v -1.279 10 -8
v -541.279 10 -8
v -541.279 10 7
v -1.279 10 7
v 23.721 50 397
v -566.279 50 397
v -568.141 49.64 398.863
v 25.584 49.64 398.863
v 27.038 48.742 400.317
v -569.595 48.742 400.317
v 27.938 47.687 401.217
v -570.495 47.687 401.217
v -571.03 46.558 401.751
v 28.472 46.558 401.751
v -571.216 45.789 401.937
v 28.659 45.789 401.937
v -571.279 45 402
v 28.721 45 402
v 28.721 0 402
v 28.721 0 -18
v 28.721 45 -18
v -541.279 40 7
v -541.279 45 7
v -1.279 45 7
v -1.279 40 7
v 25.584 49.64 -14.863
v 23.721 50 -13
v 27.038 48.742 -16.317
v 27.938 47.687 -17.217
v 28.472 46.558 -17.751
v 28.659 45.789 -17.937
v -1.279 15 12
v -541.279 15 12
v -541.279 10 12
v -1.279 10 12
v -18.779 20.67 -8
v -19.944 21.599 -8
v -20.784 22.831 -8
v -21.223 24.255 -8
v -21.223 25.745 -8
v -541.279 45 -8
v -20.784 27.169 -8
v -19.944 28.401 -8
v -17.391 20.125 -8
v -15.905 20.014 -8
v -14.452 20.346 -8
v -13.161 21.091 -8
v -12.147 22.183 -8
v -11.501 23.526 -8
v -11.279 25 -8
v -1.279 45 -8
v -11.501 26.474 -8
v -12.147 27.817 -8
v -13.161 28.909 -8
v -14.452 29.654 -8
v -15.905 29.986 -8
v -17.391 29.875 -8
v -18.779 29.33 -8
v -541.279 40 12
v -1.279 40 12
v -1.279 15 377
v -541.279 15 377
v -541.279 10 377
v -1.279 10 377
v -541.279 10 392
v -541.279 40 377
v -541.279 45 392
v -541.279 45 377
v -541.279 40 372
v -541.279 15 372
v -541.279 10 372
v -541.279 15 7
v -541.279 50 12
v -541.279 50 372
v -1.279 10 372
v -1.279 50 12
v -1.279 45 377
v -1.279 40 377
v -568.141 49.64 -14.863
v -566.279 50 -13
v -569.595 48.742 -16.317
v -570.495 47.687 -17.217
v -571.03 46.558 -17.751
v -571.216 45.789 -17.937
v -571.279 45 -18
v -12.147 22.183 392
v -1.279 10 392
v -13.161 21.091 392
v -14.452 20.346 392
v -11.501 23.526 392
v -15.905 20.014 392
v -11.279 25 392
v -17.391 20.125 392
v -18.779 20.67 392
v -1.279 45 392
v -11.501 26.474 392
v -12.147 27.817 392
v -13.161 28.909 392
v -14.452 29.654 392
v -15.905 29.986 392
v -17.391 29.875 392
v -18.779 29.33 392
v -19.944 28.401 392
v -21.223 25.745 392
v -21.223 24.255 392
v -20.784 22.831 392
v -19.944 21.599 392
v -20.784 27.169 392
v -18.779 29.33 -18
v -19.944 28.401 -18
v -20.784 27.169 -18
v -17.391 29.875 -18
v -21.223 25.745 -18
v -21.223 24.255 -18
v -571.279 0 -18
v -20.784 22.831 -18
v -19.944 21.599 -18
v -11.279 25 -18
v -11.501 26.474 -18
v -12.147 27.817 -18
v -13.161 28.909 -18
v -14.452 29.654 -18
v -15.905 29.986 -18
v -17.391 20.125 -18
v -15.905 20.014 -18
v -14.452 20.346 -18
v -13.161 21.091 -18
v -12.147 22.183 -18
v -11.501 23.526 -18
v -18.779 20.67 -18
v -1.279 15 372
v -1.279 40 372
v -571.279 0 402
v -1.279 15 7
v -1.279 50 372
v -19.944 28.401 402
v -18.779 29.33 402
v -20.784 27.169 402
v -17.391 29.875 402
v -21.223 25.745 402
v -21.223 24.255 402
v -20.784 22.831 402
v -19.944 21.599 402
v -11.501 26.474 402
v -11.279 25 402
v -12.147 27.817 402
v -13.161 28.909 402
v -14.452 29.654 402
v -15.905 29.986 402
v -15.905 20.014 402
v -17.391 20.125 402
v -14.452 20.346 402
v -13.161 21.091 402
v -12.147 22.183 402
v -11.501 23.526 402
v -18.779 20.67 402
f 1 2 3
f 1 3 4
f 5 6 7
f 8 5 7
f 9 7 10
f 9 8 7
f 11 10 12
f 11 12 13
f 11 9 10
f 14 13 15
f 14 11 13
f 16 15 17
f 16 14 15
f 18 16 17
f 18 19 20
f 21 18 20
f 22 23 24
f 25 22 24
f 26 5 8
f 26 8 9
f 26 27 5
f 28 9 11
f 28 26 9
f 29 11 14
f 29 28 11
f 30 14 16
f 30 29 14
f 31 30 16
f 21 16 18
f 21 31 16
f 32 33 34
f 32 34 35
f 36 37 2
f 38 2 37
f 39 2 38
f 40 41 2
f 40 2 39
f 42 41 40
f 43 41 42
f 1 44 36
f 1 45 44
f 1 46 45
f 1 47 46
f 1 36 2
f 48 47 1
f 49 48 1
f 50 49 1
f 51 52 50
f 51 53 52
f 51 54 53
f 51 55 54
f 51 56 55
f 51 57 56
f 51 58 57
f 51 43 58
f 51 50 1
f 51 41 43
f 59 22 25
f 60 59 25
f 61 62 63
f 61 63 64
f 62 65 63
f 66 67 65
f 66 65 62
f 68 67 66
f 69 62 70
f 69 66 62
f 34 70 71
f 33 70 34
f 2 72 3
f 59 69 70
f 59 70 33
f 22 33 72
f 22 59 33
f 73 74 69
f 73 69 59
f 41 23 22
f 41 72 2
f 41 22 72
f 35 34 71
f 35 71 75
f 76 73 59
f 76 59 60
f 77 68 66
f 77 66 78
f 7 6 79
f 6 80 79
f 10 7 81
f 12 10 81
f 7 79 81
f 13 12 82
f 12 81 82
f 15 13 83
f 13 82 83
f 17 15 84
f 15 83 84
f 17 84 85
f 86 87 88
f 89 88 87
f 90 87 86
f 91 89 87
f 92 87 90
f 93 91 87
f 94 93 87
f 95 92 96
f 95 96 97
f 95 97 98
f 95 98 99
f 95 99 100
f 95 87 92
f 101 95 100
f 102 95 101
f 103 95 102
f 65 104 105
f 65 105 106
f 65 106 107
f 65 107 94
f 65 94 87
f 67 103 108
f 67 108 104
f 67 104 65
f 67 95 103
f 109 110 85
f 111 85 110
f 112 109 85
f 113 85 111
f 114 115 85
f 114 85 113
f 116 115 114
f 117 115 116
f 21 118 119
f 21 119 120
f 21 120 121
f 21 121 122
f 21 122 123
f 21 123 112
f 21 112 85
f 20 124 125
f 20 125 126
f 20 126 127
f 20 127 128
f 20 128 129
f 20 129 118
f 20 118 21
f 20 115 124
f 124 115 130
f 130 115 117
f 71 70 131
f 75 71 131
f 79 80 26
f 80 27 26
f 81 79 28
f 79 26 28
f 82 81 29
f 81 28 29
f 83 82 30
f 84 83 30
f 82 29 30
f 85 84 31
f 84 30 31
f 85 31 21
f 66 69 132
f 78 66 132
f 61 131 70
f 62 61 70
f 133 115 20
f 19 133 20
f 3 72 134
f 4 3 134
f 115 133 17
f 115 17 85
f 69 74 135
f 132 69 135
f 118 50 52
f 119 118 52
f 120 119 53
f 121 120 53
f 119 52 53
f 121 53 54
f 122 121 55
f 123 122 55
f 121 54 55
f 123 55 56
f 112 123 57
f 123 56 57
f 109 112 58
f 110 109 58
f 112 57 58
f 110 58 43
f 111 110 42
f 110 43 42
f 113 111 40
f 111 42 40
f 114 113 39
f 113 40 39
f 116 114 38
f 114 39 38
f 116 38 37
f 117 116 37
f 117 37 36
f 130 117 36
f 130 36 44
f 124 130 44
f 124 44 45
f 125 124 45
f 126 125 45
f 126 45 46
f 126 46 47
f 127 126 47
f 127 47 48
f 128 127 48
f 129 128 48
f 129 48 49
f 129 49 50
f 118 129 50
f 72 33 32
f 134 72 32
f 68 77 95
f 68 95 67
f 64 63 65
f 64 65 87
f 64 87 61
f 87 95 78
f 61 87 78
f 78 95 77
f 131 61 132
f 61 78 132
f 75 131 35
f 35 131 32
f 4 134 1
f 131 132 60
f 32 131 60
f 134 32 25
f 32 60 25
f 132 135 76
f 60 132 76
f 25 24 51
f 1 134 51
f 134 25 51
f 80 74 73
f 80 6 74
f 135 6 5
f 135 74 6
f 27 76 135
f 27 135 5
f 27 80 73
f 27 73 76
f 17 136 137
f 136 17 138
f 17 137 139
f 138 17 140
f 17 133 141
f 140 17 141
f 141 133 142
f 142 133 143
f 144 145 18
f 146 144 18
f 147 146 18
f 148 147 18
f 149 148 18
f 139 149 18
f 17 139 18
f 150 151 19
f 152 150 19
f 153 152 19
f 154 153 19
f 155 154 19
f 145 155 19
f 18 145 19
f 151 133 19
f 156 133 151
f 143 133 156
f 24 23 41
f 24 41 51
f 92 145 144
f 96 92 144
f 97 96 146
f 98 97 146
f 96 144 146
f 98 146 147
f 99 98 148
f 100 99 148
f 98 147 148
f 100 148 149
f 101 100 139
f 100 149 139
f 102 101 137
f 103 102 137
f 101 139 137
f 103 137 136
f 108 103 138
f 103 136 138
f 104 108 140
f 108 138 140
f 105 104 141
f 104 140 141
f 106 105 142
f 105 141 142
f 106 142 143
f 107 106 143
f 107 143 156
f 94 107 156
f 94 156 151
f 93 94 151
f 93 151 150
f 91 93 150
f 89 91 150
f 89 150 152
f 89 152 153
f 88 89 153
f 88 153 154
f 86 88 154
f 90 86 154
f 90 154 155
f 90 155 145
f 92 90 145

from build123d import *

# Parameters (mm, degrees)
SKETCH_1_W          = 600
SKETCH_1_H          = 420
EXTRUDE_1_DEPTH     = 50
SKETCH_2_W          = 540
SKETCH_2_H          = 360
CUT_EXTRUDE_1_DEPTH = 40
SKETCH_3_W          = 540
SKETCH_3_H          = 30
CUT_EXTRUDE_2_DEPTH = 20
SKETCH_4_W          = 540
SKETCH_4_H          = 30
CUT_EXTRUDE_3_DEPTH = 20
SKETCH_6_W          = 540
SKETCH_6_H          = 5
EXTRUDE_3_DEPTH     = 40
SKETCH_7_W          = 540
SKETCH_7_H          = 5
EXTRUDE_4_DEPTH     = 40
SKETCH_8_W          = 540
SKETCH_8_H          = 30
CUT_EXTRUDE_4_DEPTH = 20
SKETCH_9_W          = 540
SKETCH_9_H          = 30
CUT_EXTRUDE_5_DEPTH = 20
SKETCH_11_W         = 540
SKETCH_11_H         = 5
EXTRUDE_6_DEPTH     = 10
SKETCH_12_R         = 5
CUT_EXTRUDE_6_DEPTH = 711.815967718
FILLET_1_R          = 5


with BuildPart() as part:
    # 스케치1 → 보스-돌출1 (new body)
    with BuildSketch(Plane(origin=(0, 0, 0), x_dir=(1, 0, 0), z_dir=(0, 1, 0))):
        with Locations((-271.278688525, -192)):
            Rectangle(SKETCH_1_W, SKETCH_1_H)
    extrude(amount=EXTRUDE_1_DEPTH)

    # 스케치2 → 컷-돌출1 (cut)
    with BuildSketch(Plane(origin=(0, 50, 0), x_dir=(1, 0, 0), z_dir=(0, 1, 0))):
        with Locations((-271.278688525, -192)):
            Rectangle(SKETCH_2_W, SKETCH_2_H)
    extrude(amount=-CUT_EXTRUDE_1_DEPTH, mode=Mode.SUBTRACT)

    # 스케치3 → 컷-돌출2 (cut)
    with BuildSketch(Plane.XY.offset(12)):
        with Locations((-271.278688525, 25)):
            Rectangle(SKETCH_3_W, SKETCH_3_H)
    extrude(amount=-CUT_EXTRUDE_2_DEPTH, mode=Mode.SUBTRACT)

    # 스케치4 → 컷-돌출3 (cut)
    with BuildSketch(Plane(origin=(0, 0, 372), x_dir=(-1, 0, 0), z_dir=(0, 0, -1))):
        with Locations((271.278688525, 25)):
            Rectangle(SKETCH_4_W, SKETCH_4_H)
    extrude(amount=-CUT_EXTRUDE_3_DEPTH, mode=Mode.SUBTRACT)

    # 스케치6 → 보스-돌출3 (add)
    with BuildSketch(Plane(origin=(0, 50, 0), x_dir=(1, 0, 0), z_dir=(0, 1, 0))):
        with Locations((-271.278688525, -9.5)):
            Rectangle(SKETCH_6_W, SKETCH_6_H)
    extrude(amount=-EXTRUDE_3_DEPTH)

    # 스케치7 → 보스-돌출4 (add)
    with BuildSketch(Plane(origin=(0, 50, 0), x_dir=(1, 0, 0), z_dir=(0, 1, 0))):
        with Locations((-271.278688525, -374.5)):
            Rectangle(SKETCH_7_W, SKETCH_7_H)
    extrude(amount=-EXTRUDE_4_DEPTH)

    # 스케치8 → 컷-돌출4 (cut)
    with BuildSketch(Plane(origin=(0, 0, 372), x_dir=(-1, 0, 0), z_dir=(0, 0, -1))):
        with Locations((271.278688525, 30)):
            Rectangle(SKETCH_8_W, SKETCH_8_H)
    extrude(amount=-CUT_EXTRUDE_4_DEPTH, mode=Mode.SUBTRACT)

    # 스케치9 → 컷-돌출5 (cut)
    with BuildSketch(Plane.XY.offset(12)):
        with Locations((-271.278688525, 30)):
            Rectangle(SKETCH_9_W, SKETCH_9_H)
    extrude(amount=-CUT_EXTRUDE_5_DEPTH, mode=Mode.SUBTRACT)

    # 스케치11 → 보스-돌출6 (add)
    with BuildSketch(Plane(origin=(0, 50, 0), x_dir=(1, 0, 0), z_dir=(0, 1, 0))):
        with Locations((-271.278688525, -9.5)):
            Rectangle(SKETCH_11_W, SKETCH_11_H)
        with Locations((-271.278688525, -374.5)):
            Rectangle(SKETCH_11_W, SKETCH_11_H)
    extrude(amount=-EXTRUDE_6_DEPTH)

    # 스케치12 → 컷-돌출6 (cut, through all)
    with BuildSketch(Plane.XY.offset(402)):
        with Locations((-16.278688525, 25)):
            Circle(SKETCH_12_R)
    extrude(amount=-CUT_EXTRUDE_6_DEPTH, mode=Mode.SUBTRACT)

    # 필렛1
    fillet_1_edges = [part.edges().sort_by_distance(p)[0] for p in [
        (28.721311475, 50, 192),
        (-271.278688525, 50, -18),
        (-571.278688525, 50, 192),
        (-271.278688525, 50, 402),
    ]]
    fillet(fillet_1_edges, radius=FILLET_1_R)


solid = part.part
